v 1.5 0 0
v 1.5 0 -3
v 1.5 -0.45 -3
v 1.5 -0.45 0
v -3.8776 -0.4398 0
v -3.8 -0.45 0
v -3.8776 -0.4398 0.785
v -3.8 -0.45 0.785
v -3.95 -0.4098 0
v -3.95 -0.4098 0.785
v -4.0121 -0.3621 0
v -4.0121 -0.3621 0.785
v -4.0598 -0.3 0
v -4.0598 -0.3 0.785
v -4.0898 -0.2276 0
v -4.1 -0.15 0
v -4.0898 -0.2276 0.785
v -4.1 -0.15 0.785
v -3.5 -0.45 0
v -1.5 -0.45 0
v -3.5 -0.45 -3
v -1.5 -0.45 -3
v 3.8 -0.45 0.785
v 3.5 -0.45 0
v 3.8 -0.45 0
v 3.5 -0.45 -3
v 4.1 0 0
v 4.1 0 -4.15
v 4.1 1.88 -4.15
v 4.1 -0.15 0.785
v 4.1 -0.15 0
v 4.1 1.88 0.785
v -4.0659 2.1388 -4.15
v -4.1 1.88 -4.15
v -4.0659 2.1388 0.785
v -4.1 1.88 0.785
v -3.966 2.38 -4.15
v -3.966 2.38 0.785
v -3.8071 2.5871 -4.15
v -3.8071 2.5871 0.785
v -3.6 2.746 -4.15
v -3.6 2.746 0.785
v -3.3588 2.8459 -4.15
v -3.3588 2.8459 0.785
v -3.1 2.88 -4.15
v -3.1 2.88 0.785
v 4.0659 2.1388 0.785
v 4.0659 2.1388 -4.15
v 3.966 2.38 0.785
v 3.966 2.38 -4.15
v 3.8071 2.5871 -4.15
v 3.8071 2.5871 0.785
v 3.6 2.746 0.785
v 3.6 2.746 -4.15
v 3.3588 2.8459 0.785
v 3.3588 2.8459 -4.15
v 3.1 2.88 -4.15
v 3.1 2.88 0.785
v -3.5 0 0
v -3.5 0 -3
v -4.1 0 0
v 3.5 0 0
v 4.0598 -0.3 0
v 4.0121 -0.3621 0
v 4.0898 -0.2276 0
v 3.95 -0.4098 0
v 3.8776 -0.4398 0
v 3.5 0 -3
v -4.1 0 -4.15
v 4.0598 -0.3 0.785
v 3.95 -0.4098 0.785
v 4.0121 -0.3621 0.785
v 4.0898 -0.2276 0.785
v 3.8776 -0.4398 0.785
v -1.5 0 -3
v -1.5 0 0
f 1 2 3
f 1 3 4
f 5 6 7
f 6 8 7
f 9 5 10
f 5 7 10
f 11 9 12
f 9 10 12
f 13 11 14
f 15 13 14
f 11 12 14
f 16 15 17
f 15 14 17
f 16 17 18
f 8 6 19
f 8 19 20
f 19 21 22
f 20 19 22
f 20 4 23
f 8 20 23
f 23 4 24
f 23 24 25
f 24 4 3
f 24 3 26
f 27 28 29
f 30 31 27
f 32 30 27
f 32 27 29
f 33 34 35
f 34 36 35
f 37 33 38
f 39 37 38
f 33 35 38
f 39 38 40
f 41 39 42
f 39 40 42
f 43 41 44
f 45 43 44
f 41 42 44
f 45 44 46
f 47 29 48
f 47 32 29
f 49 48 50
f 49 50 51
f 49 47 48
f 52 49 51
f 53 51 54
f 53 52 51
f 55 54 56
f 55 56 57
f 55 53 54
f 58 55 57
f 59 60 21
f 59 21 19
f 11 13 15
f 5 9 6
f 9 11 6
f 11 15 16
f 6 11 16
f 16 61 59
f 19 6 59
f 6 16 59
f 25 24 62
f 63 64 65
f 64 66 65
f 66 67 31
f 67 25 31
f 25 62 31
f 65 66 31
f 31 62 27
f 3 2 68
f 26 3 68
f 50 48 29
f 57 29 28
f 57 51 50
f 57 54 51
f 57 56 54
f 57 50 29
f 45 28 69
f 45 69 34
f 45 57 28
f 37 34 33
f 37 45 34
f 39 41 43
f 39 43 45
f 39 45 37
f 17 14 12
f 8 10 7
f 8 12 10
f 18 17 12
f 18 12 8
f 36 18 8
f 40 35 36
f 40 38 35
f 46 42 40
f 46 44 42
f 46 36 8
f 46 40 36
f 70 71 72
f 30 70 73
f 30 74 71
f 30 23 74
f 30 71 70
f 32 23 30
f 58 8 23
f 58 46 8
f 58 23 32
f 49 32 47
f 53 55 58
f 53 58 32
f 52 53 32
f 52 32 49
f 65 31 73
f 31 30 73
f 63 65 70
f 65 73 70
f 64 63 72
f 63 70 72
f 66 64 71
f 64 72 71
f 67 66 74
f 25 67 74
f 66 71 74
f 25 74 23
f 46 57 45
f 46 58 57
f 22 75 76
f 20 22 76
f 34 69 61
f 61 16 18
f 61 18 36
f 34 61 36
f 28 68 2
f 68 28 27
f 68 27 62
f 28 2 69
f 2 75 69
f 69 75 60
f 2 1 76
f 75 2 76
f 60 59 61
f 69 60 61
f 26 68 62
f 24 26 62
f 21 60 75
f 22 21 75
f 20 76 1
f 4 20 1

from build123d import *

# Parameters (mm, degrees)
SKETCH1_W           = 8.2
SKETCH1_H           = 3.33
BOSS_EXTRUDE1_DEPTH = 0.785
SKETCH2_W           = 8.2
SKETCH2_H           = 2.88
BOSS_EXTRUDE2_DEPTH = 4.15
FILLET1_R           = 1
FILLET2_R           = 0.3
SKETCH3_W           = 2
SKETCH3_H           = 3
BOSS_EXTRUDE3_DEPTH = 0.45


with BuildPart() as part:
    # Sketch1 → Boss-Extrude1 (new body)
    with BuildSketch(Plane.XY):
        with Locations((0, 1.215)):
            Rectangle(SKETCH1_W, SKETCH1_H)
    extrude(amount=BOSS_EXTRUDE1_DEPTH)

    # Sketch2 → Boss-Extrude2 (add)
    with BuildSketch(Plane(origin=(0, 0, 0), x_dir=(-1, 0, 0), z_dir=(0, 0, -1))):
        with Locations((0, 1.44)):
            Rectangle(SKETCH2_W, SKETCH2_H)
    extrude(amount=BOSS_EXTRUDE2_DEPTH)

    # Fillet1
    fillet1_edges = [part.edges().sort_by_distance(p)[0] for p in [
        (-4.1, 2.88, -1.6825),
        (4.1, 2.88, -1.6825),
    ]]
    fillet(fillet1_edges, radius=FILLET1_R)

    # Fillet2
    fillet2_edges = [part.edges().sort_by_distance(p)[0] for p in [
        (4.1, -0.45, 0.3925),
        (-4.1, -0.45, 0.3925),
    ]]
    fillet(fillet2_edges, radius=FILLET2_R)

    # Sketch3 → Boss-Extrude3 (add)
    with BuildSketch(Plane.XZ):
        with Locations((2.5, -1.5)):
            Rectangle(SKETCH3_W, SKETCH3_H)
        with Locations((-2.5, -1.5)):
            Rectangle(SKETCH3_W, SKETCH3_H)
    extrude(amount=BOSS_EXTRUDE3_DEPTH)


solid = part.part
